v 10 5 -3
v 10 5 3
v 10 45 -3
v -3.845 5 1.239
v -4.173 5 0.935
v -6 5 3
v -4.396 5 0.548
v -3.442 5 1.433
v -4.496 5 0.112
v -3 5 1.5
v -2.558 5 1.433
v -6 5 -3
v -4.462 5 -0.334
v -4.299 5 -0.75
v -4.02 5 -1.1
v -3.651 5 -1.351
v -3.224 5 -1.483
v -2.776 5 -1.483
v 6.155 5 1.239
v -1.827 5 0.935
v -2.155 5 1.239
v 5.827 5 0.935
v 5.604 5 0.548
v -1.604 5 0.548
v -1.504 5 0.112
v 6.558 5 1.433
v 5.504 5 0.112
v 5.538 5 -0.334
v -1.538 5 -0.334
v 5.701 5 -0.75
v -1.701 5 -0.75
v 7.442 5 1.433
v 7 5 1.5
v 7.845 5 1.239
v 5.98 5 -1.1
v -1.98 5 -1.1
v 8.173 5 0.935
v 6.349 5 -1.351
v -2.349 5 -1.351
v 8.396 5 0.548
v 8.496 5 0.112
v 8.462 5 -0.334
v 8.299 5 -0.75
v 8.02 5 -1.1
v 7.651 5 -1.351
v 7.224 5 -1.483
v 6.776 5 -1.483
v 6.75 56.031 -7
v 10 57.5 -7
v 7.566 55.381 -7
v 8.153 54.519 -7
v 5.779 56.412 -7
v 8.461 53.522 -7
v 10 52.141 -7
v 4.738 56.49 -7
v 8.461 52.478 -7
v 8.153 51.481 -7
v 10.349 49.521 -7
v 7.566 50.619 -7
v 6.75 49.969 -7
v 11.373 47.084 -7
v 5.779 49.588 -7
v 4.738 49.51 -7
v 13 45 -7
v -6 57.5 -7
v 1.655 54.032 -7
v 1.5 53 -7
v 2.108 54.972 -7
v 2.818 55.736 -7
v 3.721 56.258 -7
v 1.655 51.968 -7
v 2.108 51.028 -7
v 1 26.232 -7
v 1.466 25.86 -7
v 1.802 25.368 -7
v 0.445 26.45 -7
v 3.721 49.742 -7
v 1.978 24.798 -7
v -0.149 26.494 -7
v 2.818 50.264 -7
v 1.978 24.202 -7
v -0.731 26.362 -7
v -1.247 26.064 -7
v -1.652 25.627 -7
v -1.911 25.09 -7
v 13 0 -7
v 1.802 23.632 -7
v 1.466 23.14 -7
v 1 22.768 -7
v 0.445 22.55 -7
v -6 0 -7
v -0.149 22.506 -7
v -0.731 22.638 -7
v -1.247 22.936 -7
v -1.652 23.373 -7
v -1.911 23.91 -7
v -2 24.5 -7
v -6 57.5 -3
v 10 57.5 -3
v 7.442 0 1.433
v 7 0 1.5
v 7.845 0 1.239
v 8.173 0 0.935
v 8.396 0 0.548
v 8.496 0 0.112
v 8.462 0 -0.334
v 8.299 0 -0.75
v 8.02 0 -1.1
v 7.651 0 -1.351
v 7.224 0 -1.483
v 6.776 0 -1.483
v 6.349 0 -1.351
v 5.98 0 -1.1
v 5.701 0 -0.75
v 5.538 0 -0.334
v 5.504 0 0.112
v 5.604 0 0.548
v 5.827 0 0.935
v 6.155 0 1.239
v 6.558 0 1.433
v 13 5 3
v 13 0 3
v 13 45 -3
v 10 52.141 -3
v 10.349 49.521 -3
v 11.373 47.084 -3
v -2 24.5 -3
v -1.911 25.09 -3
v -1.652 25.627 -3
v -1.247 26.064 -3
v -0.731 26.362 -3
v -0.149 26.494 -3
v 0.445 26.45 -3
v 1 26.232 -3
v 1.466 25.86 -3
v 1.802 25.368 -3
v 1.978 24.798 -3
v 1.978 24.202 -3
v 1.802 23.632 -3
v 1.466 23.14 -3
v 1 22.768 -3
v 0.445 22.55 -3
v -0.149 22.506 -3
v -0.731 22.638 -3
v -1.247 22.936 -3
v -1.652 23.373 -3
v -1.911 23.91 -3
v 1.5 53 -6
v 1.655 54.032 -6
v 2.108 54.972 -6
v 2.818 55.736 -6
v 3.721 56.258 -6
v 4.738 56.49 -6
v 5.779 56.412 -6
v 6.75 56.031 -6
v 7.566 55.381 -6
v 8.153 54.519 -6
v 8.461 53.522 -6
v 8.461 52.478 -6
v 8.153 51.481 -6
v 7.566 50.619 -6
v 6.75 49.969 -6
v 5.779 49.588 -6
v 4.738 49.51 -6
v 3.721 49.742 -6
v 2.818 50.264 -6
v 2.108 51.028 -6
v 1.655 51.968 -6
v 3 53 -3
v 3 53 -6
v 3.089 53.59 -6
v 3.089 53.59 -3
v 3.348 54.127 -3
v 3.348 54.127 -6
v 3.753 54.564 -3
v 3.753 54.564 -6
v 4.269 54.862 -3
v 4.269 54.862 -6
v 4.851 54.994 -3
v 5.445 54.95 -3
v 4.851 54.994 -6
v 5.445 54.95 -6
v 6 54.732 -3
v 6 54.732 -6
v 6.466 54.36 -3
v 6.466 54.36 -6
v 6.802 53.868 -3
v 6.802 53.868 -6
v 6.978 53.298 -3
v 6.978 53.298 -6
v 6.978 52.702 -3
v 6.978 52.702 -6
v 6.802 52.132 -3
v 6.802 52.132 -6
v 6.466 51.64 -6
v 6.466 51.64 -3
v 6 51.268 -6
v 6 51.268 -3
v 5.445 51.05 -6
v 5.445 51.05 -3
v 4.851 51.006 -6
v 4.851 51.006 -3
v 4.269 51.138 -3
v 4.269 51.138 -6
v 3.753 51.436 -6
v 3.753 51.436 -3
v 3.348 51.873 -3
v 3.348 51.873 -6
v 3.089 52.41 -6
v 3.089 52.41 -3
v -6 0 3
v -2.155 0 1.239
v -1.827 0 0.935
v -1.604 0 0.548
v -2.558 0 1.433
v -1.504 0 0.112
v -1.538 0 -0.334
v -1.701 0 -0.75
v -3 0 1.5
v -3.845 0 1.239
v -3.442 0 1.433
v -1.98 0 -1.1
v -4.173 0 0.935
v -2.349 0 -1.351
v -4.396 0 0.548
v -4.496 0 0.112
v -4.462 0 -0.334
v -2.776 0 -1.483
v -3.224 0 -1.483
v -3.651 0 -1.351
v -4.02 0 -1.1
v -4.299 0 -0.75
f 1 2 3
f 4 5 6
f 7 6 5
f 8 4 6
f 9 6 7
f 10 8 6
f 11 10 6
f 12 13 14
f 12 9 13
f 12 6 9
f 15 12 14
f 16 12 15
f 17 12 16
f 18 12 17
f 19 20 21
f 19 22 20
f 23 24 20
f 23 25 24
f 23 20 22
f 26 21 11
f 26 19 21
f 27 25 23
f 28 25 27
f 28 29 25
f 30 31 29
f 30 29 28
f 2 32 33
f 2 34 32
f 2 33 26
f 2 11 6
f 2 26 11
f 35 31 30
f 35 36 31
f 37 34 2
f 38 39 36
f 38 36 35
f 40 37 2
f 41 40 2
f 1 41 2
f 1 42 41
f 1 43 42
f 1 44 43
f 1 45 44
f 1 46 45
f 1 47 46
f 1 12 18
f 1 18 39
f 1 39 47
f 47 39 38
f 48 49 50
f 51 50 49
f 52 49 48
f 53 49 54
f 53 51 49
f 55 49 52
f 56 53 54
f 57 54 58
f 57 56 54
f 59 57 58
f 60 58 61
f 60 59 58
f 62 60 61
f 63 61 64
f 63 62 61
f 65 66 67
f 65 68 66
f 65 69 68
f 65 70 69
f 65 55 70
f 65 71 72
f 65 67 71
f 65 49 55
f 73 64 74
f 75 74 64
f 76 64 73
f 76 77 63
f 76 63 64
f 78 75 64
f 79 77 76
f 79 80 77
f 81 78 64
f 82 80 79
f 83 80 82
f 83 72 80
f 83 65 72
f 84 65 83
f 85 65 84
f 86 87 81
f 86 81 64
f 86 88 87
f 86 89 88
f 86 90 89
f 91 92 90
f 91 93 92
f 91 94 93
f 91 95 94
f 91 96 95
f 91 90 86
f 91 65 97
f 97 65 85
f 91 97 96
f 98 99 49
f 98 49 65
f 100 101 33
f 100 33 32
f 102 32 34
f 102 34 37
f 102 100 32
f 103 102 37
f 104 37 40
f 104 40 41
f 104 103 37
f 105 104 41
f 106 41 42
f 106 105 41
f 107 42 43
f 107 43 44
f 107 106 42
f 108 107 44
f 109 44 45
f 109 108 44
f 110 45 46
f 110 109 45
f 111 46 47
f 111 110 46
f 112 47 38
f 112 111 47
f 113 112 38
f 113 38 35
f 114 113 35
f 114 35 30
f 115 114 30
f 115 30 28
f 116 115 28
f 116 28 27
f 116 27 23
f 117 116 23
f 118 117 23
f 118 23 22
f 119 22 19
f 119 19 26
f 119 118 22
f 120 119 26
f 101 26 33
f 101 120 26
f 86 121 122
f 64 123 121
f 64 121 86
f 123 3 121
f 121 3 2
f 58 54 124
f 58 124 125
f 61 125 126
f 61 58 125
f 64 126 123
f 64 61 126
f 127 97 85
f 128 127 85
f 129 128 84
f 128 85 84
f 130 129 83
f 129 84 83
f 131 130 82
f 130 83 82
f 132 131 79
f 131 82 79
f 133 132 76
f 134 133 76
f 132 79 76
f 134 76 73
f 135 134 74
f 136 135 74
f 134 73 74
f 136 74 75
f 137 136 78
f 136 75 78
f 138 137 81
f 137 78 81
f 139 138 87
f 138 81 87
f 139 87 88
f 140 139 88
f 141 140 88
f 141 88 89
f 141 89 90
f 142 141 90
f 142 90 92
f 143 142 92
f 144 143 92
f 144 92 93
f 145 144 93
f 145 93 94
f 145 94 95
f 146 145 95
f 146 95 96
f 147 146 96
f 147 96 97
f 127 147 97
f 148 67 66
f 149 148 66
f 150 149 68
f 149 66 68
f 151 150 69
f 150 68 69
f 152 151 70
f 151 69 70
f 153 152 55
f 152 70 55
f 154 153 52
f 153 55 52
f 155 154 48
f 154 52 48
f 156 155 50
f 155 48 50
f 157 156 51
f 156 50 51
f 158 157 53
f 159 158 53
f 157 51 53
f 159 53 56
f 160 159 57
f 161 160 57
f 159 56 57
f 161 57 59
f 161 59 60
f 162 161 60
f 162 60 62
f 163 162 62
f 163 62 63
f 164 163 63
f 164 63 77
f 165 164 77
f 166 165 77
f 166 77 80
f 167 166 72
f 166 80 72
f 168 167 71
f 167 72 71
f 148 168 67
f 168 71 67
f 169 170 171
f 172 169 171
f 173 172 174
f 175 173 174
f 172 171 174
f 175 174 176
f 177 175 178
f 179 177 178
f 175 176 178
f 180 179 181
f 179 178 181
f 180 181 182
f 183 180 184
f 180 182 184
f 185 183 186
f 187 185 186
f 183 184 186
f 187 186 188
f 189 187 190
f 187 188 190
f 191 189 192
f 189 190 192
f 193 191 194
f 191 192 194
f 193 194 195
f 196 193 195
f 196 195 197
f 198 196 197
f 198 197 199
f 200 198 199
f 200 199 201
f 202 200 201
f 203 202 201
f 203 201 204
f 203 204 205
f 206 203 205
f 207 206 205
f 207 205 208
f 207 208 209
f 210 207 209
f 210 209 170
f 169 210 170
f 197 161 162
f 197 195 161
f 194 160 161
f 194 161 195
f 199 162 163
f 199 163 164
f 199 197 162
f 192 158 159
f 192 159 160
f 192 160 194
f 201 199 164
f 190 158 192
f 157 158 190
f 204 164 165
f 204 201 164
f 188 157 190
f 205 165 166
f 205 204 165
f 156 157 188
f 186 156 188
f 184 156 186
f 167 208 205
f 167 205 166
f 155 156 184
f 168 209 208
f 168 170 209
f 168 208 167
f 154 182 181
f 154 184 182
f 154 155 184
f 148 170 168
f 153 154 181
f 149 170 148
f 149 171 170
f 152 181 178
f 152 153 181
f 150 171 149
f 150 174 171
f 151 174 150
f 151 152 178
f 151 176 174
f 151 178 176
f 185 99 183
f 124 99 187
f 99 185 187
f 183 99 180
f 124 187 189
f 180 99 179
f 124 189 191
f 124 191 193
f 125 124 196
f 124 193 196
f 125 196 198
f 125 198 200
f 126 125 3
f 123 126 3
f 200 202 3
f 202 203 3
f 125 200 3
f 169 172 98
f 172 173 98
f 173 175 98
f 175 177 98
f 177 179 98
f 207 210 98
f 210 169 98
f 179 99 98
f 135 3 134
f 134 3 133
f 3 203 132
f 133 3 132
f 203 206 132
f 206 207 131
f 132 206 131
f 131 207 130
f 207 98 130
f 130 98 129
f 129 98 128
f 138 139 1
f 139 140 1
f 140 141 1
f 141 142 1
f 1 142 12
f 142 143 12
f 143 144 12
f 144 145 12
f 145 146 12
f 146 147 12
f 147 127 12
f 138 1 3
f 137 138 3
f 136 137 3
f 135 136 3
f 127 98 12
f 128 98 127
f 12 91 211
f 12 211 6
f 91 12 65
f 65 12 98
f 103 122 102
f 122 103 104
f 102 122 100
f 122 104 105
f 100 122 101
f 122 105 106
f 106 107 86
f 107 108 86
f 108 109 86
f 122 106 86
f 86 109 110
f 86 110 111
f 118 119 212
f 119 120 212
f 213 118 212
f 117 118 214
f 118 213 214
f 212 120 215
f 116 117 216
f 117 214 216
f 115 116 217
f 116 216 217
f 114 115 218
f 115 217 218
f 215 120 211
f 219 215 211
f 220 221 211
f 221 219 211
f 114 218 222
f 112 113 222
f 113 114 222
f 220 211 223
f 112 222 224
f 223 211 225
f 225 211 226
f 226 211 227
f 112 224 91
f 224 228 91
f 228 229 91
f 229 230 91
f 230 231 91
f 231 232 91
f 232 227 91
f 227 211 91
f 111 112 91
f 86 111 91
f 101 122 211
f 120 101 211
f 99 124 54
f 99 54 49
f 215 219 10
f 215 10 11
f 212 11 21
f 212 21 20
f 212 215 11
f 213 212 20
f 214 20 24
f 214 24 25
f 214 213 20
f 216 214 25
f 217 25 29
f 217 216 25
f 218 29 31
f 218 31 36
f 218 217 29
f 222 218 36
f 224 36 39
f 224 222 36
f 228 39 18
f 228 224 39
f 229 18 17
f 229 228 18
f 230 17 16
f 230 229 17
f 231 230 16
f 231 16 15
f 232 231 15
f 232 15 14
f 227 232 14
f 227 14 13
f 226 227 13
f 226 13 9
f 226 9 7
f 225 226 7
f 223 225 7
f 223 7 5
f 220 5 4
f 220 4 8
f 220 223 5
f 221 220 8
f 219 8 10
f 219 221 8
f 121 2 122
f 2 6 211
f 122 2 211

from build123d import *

# Parameters (mm, degrees)
SKETCH_1_W          = 16
SKETCH_1_H          = 6
SKETCH_1_R          = 1.5
EXTRUDE_1_DEPTH     = 5
SKETCH_2_W          = 16
SKETCH_2_H          = 57.5
EXTRUDE_2_DEPTH     = 4
SKETCH_3_R          = 2
CUT_EXTRUDE_1_DEPTH = 60.213596412
SKETCH_4_R          = 2
CUT_EXTRUDE_2_DEPTH = 60.213596412
SKETCH_5_R          = 3.5
CUT_EXTRUDE_3_DEPTH = 1
EXTRUDE_3_DEPTH     = 3
FILLET_1_R          = 10


with BuildPart() as part:
    # 草图1 → 凸台-拉伸1 (new body)
    with BuildSketch(Plane(origin=(0, 0, 0), x_dir=(1, 0, 0), z_dir=(0, 1, 0))):
        with Locations((2, 0)):
            Rectangle(SKETCH_1_W, SKETCH_1_H)
        with Locations(Location((-3, 0, 0), (0, 0, 270))):
            Circle(SKETCH_1_R, mode=Mode.SUBTRACT)
        with Locations(Location((7, 0, 0), (0, 0, 270))):
            Circle(SKETCH_1_R, mode=Mode.SUBTRACT)
    extrude(amount=EXTRUDE_1_DEPTH)

    # 草图2 → 凸台-拉伸2 (add)
    with BuildSketch(Plane(origin=(0, 0, -3), x_dir=(-1, 0, 0), z_dir=(0, 0, -1))):
        with Locations((-2, 28.75)):
            Rectangle(SKETCH_2_W, SKETCH_2_H)
    extrude(amount=EXTRUDE_2_DEPTH)

    # 草图3 → 切除-拉伸1 (cut, through all)
    with BuildSketch(Plane(origin=(0, 0, -7), x_dir=(-1, 0, 0), z_dir=(0, 0, -1))):
        with Locations((-5, 53)):
            Circle(SKETCH_3_R)
    extrude(amount=-CUT_EXTRUDE_1_DEPTH, mode=Mode.SUBTRACT)

    # 草图4 → 切除-拉伸2 (cut, through all)
    with BuildSketch(Plane(origin=(0, 0, -7), x_dir=(-1, 0, 0), z_dir=(0, 0, -1))):
        with Locations((0, 24.5)):
            Circle(SKETCH_4_R)
    extrude(amount=-CUT_EXTRUDE_2_DEPTH, mode=Mode.SUBTRACT)

    # 草图5 → 切除-拉伸3 (cut)
    with BuildSketch(Plane(origin=(0, 0, -7), x_dir=(-1, 0, 0), z_dir=(0, 0, -1))):
        with Locations((-5, 53)):
            Circle(SKETCH_5_R)
    extrude(amount=-CUT_EXTRUDE_3_DEPTH, mode=Mode.SUBTRACT)

    # 草图6 → 凸台-拉伸3 (add)
    with BuildSketch(Plane(origin=(10, 0, 0), x_dir=(0, 0, -1), z_dir=(1, 0, 0))):
        Polygon((3, 45), (3, 5), (-3, 5), (-3, 0), (7, 0), (7, 45), align=None)
        Polygon((-3, 5), (3, 5), (3, 45), align=None)
    extrude(amount=EXTRUDE_3_DEPTH)

    # 圆角1
    # the kernel refuses this fillet: 10 mm, written as the material it adds along each edge
    with BuildSketch(Plane(origin=(10, 45, -7), x_dir=(0, 1, 0), z_dir=(0, 0, 1))) as fillet_1_piece_1:
        with BuildLine():
            CenterArc((7.141428429, -10), FILLET_1_R, 90, 45.572995999)
            Line((0, -3), (0, 0))
            Line((0, 0), (7.141428429, 0))
        make_face()
    extrude(amount=4)


solid = part.part
